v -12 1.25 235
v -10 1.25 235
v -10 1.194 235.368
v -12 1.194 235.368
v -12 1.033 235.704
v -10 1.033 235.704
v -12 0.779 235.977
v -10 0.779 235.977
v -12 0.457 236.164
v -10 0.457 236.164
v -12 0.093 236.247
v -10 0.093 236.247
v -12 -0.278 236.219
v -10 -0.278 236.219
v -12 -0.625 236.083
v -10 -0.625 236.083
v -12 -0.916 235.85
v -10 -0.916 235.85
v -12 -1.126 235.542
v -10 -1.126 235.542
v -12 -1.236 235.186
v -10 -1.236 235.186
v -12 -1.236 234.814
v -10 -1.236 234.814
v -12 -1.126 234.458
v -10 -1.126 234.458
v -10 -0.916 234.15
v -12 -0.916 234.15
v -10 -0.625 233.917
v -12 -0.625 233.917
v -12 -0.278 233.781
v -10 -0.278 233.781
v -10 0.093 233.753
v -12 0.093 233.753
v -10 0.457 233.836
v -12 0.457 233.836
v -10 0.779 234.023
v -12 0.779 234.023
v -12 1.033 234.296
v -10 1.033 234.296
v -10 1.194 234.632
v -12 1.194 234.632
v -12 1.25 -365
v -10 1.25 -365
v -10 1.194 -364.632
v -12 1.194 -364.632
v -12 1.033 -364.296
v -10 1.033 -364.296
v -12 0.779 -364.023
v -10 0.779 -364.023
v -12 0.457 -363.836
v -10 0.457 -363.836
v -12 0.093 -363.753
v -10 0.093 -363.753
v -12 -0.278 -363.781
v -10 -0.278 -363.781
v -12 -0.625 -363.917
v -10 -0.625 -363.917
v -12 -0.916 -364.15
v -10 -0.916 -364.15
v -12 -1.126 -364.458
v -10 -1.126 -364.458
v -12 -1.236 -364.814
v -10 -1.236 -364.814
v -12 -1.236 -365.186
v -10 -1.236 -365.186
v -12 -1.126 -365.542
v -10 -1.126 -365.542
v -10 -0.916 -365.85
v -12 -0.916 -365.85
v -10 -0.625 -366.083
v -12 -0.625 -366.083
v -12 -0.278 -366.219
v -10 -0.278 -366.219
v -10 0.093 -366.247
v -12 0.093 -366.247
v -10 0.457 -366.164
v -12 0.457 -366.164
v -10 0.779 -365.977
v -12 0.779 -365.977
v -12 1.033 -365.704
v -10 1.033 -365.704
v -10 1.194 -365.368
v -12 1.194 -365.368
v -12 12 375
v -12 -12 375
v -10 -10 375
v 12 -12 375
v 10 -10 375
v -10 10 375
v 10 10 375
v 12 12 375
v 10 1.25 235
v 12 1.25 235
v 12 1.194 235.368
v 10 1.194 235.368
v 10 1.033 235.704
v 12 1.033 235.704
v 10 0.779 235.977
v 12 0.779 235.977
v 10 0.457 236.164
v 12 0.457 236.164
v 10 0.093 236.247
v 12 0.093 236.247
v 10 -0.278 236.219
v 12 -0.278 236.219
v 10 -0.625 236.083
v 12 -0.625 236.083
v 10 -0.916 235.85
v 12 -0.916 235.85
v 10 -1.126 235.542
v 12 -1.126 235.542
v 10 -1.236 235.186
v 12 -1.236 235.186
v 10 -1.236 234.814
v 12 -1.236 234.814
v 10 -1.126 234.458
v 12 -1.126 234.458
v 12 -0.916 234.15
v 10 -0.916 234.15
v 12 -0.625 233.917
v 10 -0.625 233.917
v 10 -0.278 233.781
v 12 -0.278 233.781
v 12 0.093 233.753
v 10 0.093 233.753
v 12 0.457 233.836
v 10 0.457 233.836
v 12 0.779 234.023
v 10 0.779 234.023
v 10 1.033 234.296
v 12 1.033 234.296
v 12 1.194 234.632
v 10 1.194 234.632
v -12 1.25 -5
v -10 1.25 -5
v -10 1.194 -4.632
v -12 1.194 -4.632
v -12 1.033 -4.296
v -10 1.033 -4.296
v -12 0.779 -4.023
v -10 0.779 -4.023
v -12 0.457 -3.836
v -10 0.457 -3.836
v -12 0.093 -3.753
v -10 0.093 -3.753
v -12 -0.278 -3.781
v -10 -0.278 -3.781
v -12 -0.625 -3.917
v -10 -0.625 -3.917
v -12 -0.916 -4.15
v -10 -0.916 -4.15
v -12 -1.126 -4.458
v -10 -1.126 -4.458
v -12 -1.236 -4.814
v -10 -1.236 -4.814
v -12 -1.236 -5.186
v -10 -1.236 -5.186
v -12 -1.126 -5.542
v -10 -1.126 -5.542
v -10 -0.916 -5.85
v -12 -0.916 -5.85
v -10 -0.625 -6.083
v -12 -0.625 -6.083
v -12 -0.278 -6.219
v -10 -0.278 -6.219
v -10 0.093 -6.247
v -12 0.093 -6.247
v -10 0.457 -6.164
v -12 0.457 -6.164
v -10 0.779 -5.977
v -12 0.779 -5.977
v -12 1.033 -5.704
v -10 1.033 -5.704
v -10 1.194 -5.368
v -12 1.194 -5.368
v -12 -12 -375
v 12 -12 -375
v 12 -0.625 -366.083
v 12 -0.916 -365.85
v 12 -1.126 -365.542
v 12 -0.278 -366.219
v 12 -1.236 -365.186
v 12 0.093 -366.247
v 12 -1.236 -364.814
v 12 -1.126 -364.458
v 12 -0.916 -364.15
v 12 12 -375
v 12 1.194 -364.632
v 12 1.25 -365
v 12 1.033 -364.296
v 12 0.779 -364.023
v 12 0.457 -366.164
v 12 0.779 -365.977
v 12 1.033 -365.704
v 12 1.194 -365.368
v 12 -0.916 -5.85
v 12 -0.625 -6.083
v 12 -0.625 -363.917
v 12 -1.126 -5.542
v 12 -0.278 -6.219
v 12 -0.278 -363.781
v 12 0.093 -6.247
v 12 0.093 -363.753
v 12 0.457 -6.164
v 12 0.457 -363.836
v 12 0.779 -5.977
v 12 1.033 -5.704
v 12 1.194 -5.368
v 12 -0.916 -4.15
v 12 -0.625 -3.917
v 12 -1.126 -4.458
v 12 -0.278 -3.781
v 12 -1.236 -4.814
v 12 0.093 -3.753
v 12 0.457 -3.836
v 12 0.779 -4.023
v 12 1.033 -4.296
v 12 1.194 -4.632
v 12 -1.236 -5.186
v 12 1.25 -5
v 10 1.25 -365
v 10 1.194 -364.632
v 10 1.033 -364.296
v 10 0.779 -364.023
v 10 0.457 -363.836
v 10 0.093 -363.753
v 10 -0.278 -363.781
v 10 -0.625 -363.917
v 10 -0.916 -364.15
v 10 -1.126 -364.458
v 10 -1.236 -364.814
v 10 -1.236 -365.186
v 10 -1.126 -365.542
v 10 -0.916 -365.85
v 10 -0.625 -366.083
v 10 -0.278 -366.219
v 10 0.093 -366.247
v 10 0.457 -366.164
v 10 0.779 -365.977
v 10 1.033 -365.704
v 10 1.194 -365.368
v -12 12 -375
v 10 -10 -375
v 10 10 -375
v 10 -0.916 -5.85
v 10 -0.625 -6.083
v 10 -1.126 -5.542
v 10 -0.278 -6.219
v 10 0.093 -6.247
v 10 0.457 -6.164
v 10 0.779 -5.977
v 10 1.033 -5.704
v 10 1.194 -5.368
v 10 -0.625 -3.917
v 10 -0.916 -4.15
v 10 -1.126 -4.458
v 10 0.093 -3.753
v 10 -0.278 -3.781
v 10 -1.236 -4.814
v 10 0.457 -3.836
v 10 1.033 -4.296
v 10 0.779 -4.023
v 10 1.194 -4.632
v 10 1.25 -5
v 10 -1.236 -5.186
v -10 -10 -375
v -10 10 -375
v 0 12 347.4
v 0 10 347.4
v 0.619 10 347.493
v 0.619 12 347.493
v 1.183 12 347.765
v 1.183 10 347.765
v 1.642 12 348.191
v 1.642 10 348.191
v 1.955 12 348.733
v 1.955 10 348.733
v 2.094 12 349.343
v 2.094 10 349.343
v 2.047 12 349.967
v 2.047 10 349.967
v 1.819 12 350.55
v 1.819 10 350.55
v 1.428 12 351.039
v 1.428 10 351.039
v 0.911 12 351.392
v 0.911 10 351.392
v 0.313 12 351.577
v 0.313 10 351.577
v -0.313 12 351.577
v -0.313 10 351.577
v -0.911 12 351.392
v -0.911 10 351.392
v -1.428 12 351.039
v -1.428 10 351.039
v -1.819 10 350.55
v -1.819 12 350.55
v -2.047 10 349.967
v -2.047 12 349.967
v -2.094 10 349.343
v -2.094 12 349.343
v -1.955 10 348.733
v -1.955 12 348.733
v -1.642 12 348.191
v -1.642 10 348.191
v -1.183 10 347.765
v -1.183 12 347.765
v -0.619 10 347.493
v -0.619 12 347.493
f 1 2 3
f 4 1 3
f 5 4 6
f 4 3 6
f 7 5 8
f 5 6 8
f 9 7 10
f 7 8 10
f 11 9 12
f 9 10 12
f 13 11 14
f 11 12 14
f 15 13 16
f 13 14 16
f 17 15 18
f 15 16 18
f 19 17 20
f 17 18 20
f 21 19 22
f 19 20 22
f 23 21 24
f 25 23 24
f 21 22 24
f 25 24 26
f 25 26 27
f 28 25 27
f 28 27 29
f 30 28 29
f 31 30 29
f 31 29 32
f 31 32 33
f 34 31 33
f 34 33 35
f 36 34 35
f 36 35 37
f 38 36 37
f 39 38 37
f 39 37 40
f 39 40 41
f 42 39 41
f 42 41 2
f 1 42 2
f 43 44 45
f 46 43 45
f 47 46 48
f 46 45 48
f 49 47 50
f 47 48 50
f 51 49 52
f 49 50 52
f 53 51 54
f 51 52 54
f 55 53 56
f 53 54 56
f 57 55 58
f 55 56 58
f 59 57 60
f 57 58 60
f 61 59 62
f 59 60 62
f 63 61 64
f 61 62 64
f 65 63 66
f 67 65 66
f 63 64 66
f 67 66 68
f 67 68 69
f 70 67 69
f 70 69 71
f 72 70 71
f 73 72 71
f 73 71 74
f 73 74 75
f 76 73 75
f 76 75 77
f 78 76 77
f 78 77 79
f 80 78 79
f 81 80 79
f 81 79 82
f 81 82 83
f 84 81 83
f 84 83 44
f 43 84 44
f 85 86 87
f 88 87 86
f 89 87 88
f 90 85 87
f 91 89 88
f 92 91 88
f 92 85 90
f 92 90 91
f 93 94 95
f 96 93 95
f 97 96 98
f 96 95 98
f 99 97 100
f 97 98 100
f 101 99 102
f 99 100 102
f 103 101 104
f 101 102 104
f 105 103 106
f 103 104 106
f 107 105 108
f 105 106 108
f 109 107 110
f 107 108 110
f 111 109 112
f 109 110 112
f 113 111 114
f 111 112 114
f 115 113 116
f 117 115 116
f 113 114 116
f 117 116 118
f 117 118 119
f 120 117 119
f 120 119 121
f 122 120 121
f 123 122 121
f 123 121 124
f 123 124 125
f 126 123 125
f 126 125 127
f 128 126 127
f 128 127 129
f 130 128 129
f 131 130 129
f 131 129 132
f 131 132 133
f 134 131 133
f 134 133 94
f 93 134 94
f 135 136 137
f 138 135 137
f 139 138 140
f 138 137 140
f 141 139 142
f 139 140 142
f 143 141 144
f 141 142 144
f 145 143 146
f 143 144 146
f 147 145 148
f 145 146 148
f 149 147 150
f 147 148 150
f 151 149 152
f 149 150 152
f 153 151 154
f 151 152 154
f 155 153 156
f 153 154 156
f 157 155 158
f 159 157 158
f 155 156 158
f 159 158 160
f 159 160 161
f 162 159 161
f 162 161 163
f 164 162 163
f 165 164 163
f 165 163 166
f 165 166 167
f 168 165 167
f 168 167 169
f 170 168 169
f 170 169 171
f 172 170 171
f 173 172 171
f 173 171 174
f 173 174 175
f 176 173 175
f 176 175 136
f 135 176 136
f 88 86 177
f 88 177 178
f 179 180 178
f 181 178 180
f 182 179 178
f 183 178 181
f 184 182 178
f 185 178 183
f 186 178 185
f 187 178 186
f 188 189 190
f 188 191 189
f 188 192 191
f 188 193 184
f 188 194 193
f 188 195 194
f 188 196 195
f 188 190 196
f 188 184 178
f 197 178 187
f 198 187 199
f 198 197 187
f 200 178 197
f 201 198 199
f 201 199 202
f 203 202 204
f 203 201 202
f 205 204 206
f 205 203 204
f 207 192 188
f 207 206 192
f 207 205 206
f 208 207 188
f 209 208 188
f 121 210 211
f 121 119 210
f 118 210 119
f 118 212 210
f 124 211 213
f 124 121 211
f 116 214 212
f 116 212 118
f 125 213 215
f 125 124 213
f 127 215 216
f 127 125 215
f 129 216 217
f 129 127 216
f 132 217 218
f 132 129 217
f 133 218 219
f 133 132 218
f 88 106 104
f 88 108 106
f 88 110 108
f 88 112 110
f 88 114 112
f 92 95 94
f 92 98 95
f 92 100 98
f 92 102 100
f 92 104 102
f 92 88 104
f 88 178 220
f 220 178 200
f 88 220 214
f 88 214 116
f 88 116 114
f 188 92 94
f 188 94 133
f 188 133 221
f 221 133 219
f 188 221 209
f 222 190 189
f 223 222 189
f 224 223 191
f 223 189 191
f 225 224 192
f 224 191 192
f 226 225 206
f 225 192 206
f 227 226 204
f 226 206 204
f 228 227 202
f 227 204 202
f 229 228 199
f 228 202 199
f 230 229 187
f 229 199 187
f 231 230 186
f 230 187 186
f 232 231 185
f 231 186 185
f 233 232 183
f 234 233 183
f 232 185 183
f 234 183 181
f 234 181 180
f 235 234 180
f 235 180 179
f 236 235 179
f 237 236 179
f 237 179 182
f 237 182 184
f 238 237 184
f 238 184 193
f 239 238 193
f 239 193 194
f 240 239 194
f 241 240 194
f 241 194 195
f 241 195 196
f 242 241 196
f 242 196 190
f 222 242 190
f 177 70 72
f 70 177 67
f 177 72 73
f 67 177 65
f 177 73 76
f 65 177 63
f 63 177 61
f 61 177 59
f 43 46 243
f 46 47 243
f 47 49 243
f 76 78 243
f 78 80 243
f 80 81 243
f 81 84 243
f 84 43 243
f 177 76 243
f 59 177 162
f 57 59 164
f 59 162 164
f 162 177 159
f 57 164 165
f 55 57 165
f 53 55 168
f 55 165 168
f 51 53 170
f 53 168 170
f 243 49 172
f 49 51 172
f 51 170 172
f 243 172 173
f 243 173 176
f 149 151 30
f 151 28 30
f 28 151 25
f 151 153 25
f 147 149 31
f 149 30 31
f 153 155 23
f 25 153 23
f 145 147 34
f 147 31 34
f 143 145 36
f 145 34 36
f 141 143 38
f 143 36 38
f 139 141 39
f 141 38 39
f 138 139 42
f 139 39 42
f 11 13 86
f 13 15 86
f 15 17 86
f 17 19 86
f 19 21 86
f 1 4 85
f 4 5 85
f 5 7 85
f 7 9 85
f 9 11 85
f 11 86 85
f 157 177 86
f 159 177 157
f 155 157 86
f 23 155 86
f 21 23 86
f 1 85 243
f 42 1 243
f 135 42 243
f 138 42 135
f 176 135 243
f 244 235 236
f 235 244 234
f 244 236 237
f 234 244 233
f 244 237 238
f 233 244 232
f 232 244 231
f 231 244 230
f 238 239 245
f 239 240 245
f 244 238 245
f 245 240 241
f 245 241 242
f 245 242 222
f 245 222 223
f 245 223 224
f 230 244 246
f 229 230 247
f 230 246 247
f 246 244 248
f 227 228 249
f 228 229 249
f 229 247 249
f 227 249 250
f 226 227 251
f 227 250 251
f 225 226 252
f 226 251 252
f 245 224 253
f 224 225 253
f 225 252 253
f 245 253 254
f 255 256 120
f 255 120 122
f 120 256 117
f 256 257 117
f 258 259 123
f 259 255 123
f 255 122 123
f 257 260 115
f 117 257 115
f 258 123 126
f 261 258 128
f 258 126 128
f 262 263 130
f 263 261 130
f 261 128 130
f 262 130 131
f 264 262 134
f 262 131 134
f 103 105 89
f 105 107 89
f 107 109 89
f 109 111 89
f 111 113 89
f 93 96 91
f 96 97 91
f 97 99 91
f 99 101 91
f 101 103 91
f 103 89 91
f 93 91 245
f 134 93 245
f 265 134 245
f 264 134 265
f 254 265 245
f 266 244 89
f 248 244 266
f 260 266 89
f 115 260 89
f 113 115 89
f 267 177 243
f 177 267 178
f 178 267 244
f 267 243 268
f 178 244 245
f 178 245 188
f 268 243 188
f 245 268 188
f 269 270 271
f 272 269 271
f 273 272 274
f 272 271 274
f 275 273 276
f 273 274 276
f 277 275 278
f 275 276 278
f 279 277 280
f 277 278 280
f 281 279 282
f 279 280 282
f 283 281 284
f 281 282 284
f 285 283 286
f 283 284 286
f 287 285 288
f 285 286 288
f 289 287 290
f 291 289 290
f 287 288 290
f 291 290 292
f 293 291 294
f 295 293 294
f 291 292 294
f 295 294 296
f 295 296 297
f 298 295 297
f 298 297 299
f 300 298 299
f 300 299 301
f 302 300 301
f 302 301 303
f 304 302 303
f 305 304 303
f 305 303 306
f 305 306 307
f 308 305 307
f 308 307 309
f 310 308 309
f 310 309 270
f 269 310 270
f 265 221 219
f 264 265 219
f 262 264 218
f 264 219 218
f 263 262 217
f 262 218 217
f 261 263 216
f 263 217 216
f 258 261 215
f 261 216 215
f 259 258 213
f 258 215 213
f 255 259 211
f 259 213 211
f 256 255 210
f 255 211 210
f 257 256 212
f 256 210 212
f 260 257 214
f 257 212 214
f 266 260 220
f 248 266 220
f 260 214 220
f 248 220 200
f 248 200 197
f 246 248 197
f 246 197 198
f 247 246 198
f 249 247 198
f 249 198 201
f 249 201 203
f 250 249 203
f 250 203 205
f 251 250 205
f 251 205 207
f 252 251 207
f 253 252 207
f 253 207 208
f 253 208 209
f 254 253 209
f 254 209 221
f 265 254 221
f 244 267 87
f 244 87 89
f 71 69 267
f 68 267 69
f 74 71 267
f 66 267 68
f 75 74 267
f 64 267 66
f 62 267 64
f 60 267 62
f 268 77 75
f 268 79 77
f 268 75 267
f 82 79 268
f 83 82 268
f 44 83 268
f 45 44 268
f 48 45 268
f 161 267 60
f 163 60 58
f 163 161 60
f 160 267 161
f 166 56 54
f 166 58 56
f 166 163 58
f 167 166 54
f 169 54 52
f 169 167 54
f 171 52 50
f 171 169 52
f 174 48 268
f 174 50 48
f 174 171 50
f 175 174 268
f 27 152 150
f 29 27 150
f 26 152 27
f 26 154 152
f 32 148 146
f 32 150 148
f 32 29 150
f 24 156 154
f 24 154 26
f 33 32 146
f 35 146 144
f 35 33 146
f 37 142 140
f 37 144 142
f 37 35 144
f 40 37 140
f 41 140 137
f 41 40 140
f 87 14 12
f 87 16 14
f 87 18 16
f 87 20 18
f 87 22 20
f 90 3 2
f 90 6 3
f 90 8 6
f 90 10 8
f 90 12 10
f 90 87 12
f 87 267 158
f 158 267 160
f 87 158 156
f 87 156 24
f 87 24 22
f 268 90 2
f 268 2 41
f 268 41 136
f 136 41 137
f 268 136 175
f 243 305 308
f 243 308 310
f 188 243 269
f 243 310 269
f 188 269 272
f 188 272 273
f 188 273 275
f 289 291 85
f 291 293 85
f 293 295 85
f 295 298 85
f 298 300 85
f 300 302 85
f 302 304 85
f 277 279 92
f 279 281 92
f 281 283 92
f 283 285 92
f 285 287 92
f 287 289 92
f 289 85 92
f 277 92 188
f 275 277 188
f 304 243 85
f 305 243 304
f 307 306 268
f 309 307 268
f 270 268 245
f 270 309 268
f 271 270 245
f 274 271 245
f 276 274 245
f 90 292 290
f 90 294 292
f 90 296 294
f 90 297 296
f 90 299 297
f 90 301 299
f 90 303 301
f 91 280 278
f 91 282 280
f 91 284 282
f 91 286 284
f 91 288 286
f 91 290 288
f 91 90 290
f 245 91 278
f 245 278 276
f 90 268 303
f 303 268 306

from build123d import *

# Parameters (mm, degrees)
SKETCH_1_W             = 24
SKETCH_1_H             = 24
SKETCH_1_W_2           = 20
SKETCH_1_H_2           = 20
EXTRUDE_1_DEPTH        = 375
HOLE_WIZARD_M3_1_D     = 2.5
HOLE_WIZARD_M5_1_D     = 4.2
HOLE_WIZARD_M5_1_DEPTH = 10
HOLE_WIZARD_M5_1_TIP   = 1.2618073


with BuildPart() as part:
    # 草图1 → 凸台-拉伸1 (new, symmetric)
    with BuildSketch(Plane.XY):
        Rectangle(SKETCH_1_W, SKETCH_1_H)
        Rectangle(SKETCH_1_W_2, SKETCH_1_H_2, mode=Mode.SUBTRACT)
    extrude(amount=EXTRUDE_1_DEPTH, both=True)

    # M3 螺纹孔的螺纹孔钻头1 (through all)
    with Locations(Plane(origin=(-12, 0, -365), x_dir=(0, -1, 0), z_dir=(-1, 0, 0))):
        with Locations((0, 0), (0, 360), (0, 600)):
            Hole(HOLE_WIZARD_M3_1_D / 2)

    # M5 螺纹孔的螺纹孔钻头1
    with Locations(Plane(origin=(0, 12, 349.5), x_dir=(0, 0, 1), z_dir=(0, 1, 0))):
        with Locations((0, 0)):
            Hole(HOLE_WIZARD_M5_1_D / 2, depth=HOLE_WIZARD_M5_1_DEPTH)
            with Locations((0, 0, -(HOLE_WIZARD_M5_1_DEPTH + HOLE_WIZARD_M5_1_TIP / 2))):  # 118° drill point
                Cone(0, HOLE_WIZARD_M5_1_D / 2, HOLE_WIZARD_M5_1_TIP, mode=Mode.SUBTRACT)


solid = part.part
